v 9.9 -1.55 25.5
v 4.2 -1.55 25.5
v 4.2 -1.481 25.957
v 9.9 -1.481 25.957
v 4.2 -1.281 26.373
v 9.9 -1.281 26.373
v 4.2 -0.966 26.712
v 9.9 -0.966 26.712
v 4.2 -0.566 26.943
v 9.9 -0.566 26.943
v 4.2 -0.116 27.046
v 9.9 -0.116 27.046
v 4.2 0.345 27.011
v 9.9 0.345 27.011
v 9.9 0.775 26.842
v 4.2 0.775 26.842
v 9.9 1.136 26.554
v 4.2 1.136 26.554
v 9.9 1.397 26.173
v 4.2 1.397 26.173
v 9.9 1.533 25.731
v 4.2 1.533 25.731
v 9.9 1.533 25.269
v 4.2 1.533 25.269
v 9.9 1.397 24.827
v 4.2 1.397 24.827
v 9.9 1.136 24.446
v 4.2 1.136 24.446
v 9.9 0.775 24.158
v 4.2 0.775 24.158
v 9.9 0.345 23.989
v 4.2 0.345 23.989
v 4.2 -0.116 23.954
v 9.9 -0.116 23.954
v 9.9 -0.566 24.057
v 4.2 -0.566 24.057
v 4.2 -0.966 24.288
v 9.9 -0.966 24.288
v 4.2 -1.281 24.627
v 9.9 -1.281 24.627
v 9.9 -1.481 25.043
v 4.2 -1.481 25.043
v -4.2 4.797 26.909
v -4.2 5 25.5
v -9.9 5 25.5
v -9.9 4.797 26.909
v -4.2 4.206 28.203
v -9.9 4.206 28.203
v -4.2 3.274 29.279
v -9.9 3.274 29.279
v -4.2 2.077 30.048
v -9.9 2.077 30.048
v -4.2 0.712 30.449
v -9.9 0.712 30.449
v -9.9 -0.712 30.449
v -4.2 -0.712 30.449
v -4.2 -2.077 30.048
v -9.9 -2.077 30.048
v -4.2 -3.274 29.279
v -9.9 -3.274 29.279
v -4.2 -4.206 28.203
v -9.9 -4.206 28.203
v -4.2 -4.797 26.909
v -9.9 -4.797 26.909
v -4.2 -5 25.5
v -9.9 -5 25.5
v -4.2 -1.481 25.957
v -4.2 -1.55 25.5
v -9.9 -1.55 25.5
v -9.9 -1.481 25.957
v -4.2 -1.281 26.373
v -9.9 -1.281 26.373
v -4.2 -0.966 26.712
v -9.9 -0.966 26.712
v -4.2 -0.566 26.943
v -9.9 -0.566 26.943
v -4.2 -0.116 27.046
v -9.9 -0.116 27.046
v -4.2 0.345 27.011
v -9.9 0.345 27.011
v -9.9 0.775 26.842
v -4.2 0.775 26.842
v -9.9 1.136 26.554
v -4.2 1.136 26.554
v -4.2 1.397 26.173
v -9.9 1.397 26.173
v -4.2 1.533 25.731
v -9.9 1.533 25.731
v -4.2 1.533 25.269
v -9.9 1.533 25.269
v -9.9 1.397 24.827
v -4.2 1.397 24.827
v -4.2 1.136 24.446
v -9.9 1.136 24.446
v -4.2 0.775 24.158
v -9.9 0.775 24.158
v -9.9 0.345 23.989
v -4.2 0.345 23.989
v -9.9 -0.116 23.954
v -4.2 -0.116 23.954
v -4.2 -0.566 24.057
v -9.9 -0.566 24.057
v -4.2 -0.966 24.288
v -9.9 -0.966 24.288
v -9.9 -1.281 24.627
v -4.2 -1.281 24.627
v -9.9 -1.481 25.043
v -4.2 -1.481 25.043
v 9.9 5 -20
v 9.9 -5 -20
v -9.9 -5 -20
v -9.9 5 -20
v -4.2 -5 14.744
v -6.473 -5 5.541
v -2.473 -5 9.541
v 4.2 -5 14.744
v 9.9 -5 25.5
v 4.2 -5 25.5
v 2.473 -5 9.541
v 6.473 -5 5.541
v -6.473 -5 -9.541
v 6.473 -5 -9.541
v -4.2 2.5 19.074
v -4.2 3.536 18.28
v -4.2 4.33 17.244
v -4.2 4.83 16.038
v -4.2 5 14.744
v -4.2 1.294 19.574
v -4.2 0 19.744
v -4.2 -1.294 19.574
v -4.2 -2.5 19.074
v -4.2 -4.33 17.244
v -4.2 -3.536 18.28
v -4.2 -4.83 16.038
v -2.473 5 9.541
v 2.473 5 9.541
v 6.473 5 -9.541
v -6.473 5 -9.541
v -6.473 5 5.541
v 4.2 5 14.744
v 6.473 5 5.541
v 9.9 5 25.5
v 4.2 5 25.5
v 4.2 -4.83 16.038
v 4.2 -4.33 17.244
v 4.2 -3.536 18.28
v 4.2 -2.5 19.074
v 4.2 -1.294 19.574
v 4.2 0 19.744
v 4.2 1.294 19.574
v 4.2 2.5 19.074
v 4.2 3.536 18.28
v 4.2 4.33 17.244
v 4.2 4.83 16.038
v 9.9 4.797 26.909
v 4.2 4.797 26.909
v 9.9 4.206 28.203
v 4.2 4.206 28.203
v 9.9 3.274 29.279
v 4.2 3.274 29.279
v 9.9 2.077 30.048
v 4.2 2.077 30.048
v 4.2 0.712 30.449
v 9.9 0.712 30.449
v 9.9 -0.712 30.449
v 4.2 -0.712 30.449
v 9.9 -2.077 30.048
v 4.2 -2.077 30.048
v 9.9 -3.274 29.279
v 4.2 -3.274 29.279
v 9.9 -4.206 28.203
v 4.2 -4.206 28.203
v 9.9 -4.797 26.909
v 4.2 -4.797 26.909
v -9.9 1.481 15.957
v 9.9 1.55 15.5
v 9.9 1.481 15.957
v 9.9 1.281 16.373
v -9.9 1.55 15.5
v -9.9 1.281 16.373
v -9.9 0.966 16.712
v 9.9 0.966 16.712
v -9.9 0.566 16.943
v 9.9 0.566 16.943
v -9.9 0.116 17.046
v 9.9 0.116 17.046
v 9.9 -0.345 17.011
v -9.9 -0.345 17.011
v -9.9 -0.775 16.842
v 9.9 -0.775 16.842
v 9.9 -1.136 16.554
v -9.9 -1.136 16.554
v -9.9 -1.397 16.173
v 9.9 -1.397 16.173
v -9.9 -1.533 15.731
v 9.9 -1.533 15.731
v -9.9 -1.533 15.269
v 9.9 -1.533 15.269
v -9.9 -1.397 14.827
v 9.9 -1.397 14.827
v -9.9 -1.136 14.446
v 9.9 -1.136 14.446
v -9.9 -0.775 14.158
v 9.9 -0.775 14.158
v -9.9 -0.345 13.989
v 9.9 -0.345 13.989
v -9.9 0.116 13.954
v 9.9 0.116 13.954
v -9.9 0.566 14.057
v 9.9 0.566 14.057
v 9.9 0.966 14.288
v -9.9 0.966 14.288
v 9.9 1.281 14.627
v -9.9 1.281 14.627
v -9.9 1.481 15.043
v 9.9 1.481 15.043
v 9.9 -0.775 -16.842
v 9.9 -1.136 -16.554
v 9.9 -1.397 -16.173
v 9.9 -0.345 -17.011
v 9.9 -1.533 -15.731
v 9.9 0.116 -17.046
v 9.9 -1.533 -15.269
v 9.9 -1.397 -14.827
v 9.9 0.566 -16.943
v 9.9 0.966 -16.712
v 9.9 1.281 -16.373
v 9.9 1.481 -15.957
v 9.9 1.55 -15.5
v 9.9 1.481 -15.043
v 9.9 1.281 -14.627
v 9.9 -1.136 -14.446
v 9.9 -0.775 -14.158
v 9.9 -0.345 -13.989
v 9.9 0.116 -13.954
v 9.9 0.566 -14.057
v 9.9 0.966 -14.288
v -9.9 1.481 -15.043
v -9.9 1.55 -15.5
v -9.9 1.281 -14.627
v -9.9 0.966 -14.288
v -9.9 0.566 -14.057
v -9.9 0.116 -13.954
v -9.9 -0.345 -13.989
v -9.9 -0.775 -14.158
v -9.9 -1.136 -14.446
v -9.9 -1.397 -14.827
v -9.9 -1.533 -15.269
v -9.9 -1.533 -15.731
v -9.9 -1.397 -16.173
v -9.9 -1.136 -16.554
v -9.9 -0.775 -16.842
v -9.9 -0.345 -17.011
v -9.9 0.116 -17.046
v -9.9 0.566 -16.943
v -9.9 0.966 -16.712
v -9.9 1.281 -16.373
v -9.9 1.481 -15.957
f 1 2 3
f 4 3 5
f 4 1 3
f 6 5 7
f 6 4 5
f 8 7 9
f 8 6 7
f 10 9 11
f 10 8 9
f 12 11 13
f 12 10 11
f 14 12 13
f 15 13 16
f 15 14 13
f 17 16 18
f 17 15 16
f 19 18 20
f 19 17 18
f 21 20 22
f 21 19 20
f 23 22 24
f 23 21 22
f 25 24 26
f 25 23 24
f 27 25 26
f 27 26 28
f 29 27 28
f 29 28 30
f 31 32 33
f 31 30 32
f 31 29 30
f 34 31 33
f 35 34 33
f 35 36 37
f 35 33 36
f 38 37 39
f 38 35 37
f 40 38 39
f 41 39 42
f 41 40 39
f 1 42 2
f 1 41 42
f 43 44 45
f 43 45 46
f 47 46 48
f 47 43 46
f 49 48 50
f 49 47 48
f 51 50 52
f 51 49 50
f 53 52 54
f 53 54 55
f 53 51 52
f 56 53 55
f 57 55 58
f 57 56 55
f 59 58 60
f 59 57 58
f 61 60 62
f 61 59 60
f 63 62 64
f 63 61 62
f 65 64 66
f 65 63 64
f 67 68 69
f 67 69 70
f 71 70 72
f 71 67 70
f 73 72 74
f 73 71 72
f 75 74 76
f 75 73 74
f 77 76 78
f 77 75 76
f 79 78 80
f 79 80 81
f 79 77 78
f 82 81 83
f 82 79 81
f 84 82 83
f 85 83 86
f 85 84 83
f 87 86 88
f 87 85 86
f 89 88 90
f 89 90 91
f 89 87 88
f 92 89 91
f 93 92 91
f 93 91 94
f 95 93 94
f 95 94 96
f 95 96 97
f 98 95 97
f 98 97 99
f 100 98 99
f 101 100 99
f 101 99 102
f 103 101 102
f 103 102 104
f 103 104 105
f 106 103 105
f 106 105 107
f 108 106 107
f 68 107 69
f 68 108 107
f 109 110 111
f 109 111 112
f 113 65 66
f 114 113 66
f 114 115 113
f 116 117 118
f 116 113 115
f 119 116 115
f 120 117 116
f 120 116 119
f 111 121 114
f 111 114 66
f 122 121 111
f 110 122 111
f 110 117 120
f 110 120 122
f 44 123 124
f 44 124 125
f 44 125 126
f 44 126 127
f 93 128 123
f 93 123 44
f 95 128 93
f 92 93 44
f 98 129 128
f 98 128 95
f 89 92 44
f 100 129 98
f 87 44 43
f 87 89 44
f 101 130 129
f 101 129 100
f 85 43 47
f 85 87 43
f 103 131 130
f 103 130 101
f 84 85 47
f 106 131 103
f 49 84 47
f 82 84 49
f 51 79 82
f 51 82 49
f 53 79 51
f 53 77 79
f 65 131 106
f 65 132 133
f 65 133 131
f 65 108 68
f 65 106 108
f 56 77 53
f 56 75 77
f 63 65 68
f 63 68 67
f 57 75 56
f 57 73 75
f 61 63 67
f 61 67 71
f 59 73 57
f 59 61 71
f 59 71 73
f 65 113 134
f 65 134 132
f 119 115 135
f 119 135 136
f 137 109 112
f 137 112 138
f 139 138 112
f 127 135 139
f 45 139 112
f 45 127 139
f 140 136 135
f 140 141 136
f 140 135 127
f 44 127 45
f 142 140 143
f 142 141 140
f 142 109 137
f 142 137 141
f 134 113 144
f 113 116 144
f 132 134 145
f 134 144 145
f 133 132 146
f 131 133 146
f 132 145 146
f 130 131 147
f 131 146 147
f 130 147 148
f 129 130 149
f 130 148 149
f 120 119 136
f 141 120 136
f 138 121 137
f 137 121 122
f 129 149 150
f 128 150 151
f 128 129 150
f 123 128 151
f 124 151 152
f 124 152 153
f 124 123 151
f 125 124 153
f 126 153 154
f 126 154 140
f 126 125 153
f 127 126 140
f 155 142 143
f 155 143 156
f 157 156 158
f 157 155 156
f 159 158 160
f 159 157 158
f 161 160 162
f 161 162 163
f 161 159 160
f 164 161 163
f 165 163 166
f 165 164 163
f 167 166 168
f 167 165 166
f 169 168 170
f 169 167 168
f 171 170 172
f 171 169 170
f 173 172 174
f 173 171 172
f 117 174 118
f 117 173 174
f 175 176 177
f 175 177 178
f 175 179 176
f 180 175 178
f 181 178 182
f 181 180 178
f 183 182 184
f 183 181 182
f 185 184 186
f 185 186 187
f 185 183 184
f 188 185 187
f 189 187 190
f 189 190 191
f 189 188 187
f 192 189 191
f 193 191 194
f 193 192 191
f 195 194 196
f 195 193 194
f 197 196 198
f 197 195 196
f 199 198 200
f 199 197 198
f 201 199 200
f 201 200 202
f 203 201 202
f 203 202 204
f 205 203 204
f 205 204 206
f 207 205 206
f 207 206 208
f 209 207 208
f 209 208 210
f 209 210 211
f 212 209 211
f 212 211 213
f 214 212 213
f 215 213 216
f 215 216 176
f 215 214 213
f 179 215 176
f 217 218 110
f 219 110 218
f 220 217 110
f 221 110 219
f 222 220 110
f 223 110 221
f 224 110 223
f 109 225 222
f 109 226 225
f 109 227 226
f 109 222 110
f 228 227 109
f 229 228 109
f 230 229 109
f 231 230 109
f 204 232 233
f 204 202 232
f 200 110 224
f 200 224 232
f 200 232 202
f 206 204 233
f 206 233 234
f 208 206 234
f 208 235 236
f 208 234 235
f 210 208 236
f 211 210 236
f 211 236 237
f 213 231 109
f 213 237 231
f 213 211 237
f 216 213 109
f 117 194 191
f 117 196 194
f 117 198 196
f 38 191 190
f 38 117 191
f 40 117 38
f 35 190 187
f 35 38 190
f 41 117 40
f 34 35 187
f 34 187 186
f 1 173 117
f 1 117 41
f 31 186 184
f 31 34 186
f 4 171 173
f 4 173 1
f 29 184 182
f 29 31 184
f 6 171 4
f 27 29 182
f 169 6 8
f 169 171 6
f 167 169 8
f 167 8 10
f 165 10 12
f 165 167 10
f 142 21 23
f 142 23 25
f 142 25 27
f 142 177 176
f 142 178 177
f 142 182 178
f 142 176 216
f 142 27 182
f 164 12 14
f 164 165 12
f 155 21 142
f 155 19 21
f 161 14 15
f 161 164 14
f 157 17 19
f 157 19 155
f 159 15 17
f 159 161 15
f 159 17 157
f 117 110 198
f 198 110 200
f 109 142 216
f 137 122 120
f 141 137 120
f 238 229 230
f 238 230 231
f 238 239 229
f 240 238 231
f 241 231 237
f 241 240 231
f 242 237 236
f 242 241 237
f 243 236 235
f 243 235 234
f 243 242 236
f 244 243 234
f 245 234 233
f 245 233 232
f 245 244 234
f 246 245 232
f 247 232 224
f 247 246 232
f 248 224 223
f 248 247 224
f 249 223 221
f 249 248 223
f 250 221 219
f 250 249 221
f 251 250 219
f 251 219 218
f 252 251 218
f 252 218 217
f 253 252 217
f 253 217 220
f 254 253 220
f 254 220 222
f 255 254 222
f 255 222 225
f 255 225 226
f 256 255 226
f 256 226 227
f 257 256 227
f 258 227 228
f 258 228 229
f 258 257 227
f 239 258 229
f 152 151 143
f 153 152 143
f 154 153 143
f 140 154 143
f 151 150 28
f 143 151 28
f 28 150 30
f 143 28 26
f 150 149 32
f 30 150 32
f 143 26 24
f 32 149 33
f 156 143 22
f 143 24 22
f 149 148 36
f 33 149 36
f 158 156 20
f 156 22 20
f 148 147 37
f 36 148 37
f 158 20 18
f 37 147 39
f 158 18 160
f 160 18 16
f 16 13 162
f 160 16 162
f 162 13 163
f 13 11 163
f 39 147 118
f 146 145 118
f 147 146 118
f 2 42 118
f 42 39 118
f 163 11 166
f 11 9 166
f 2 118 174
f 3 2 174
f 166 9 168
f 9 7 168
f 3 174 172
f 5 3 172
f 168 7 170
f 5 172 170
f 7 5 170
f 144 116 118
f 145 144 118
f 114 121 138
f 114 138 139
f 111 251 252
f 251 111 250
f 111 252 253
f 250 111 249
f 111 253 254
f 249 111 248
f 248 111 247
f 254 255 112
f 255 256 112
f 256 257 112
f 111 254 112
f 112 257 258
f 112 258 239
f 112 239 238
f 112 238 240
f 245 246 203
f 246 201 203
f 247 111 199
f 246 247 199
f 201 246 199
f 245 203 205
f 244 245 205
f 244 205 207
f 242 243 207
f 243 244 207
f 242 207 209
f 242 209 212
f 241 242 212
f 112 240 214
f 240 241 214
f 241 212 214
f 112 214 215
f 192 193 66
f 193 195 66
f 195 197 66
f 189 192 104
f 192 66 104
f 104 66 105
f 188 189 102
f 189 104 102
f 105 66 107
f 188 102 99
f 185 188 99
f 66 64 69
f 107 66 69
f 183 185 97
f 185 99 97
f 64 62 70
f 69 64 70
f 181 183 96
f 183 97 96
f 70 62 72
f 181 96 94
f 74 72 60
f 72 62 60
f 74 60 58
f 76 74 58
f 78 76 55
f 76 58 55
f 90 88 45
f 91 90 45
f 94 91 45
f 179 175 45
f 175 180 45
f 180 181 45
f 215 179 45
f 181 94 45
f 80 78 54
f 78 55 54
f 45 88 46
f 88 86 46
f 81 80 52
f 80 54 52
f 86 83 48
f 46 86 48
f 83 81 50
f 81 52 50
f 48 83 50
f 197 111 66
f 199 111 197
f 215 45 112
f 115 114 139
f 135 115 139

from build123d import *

# Parameters (mm, degrees)
F0_R     = 1.55
F1_DEPTH = 9.9
F2_W     = 8.4
F2_H     = 11.5120084733
F2_W_2   = 12.9466587678
F2_H_2   = 19.0824847668
F3_DEPTH = 25
F4_R     = 4.99999
F5_SIZE  = 4


# Not quite as in the source:
# - a fillet or chamfer is up to 0.001 mm smaller than in the source, because OpenCascade refuses the exact size
# - a feature names something its author has since deleted; it is built from what else it names


with BuildPart() as f1:
    # F0 (on Right) → F1 (new body, symmetric)
    with BuildSketch(Plane.YZ):
        with BuildLine():
            Line((-5, 25.5), (-5, -20))
            Line((-5, -20), (5, -20))
            Line((5, -20), (5, 25.5))
            Line((5, 25.5), (1.55, 25.5))
            ThreePointArc((1.55, 25.5), (0, 23.95), (-1.55, 25.5))
            Line((-1.55, 25.5), (-5, 25.5))
        make_face()
        with Locations((0, -15.5)):
            Circle(F0_R, mode=Mode.SUBTRACT)
        with Locations((0, 15.5)):
            Circle(F0_R, mode=Mode.SUBTRACT)
        with BuildLine():
            ThreePointArc((5, 25.5), (0, 30.5), (-5, 25.5))
            Line((-5, 25.5), (-1.55, 25.5))
            ThreePointArc((-1.55, 25.5), (0, 27.05), (1.55, 25.5))
            Line((1.55, 25.5), (5, 25.5))
        make_face()
    extrude(amount=F1_DEPTH, both=True)

    # F2 (on face) → F3 (cut)
    with BuildSketch(Plane.XZ.offset(5)):
        with Locations((0, 25.5)):
            Rectangle(F2_W, F2_H)
        Rectangle(F2_W_2, F2_H_2)
    extrude(amount=-F3_DEPTH, mode=Mode.SUBTRACT)

    # F4 (radius 5 in the source; OpenCascade refuses exactly that, so slightly less here)
    f4_edges = [f1.edges().sort_by_distance(p)[0] for p in [
        (0, -5, 19.743996),
        (0, 5, 19.743996),
    ]]
    fillet(f4_edges, radius=F4_R)

    # F5
    f5_edges = [f1.edges().sort_by_distance(p)[0] for p in [
        (6.473329, 0, 9.541242),
        (-6.473329, 0, 9.541242),
    ]]
    chamfer(f5_edges, length=F5_SIZE)


solid = f1.part
